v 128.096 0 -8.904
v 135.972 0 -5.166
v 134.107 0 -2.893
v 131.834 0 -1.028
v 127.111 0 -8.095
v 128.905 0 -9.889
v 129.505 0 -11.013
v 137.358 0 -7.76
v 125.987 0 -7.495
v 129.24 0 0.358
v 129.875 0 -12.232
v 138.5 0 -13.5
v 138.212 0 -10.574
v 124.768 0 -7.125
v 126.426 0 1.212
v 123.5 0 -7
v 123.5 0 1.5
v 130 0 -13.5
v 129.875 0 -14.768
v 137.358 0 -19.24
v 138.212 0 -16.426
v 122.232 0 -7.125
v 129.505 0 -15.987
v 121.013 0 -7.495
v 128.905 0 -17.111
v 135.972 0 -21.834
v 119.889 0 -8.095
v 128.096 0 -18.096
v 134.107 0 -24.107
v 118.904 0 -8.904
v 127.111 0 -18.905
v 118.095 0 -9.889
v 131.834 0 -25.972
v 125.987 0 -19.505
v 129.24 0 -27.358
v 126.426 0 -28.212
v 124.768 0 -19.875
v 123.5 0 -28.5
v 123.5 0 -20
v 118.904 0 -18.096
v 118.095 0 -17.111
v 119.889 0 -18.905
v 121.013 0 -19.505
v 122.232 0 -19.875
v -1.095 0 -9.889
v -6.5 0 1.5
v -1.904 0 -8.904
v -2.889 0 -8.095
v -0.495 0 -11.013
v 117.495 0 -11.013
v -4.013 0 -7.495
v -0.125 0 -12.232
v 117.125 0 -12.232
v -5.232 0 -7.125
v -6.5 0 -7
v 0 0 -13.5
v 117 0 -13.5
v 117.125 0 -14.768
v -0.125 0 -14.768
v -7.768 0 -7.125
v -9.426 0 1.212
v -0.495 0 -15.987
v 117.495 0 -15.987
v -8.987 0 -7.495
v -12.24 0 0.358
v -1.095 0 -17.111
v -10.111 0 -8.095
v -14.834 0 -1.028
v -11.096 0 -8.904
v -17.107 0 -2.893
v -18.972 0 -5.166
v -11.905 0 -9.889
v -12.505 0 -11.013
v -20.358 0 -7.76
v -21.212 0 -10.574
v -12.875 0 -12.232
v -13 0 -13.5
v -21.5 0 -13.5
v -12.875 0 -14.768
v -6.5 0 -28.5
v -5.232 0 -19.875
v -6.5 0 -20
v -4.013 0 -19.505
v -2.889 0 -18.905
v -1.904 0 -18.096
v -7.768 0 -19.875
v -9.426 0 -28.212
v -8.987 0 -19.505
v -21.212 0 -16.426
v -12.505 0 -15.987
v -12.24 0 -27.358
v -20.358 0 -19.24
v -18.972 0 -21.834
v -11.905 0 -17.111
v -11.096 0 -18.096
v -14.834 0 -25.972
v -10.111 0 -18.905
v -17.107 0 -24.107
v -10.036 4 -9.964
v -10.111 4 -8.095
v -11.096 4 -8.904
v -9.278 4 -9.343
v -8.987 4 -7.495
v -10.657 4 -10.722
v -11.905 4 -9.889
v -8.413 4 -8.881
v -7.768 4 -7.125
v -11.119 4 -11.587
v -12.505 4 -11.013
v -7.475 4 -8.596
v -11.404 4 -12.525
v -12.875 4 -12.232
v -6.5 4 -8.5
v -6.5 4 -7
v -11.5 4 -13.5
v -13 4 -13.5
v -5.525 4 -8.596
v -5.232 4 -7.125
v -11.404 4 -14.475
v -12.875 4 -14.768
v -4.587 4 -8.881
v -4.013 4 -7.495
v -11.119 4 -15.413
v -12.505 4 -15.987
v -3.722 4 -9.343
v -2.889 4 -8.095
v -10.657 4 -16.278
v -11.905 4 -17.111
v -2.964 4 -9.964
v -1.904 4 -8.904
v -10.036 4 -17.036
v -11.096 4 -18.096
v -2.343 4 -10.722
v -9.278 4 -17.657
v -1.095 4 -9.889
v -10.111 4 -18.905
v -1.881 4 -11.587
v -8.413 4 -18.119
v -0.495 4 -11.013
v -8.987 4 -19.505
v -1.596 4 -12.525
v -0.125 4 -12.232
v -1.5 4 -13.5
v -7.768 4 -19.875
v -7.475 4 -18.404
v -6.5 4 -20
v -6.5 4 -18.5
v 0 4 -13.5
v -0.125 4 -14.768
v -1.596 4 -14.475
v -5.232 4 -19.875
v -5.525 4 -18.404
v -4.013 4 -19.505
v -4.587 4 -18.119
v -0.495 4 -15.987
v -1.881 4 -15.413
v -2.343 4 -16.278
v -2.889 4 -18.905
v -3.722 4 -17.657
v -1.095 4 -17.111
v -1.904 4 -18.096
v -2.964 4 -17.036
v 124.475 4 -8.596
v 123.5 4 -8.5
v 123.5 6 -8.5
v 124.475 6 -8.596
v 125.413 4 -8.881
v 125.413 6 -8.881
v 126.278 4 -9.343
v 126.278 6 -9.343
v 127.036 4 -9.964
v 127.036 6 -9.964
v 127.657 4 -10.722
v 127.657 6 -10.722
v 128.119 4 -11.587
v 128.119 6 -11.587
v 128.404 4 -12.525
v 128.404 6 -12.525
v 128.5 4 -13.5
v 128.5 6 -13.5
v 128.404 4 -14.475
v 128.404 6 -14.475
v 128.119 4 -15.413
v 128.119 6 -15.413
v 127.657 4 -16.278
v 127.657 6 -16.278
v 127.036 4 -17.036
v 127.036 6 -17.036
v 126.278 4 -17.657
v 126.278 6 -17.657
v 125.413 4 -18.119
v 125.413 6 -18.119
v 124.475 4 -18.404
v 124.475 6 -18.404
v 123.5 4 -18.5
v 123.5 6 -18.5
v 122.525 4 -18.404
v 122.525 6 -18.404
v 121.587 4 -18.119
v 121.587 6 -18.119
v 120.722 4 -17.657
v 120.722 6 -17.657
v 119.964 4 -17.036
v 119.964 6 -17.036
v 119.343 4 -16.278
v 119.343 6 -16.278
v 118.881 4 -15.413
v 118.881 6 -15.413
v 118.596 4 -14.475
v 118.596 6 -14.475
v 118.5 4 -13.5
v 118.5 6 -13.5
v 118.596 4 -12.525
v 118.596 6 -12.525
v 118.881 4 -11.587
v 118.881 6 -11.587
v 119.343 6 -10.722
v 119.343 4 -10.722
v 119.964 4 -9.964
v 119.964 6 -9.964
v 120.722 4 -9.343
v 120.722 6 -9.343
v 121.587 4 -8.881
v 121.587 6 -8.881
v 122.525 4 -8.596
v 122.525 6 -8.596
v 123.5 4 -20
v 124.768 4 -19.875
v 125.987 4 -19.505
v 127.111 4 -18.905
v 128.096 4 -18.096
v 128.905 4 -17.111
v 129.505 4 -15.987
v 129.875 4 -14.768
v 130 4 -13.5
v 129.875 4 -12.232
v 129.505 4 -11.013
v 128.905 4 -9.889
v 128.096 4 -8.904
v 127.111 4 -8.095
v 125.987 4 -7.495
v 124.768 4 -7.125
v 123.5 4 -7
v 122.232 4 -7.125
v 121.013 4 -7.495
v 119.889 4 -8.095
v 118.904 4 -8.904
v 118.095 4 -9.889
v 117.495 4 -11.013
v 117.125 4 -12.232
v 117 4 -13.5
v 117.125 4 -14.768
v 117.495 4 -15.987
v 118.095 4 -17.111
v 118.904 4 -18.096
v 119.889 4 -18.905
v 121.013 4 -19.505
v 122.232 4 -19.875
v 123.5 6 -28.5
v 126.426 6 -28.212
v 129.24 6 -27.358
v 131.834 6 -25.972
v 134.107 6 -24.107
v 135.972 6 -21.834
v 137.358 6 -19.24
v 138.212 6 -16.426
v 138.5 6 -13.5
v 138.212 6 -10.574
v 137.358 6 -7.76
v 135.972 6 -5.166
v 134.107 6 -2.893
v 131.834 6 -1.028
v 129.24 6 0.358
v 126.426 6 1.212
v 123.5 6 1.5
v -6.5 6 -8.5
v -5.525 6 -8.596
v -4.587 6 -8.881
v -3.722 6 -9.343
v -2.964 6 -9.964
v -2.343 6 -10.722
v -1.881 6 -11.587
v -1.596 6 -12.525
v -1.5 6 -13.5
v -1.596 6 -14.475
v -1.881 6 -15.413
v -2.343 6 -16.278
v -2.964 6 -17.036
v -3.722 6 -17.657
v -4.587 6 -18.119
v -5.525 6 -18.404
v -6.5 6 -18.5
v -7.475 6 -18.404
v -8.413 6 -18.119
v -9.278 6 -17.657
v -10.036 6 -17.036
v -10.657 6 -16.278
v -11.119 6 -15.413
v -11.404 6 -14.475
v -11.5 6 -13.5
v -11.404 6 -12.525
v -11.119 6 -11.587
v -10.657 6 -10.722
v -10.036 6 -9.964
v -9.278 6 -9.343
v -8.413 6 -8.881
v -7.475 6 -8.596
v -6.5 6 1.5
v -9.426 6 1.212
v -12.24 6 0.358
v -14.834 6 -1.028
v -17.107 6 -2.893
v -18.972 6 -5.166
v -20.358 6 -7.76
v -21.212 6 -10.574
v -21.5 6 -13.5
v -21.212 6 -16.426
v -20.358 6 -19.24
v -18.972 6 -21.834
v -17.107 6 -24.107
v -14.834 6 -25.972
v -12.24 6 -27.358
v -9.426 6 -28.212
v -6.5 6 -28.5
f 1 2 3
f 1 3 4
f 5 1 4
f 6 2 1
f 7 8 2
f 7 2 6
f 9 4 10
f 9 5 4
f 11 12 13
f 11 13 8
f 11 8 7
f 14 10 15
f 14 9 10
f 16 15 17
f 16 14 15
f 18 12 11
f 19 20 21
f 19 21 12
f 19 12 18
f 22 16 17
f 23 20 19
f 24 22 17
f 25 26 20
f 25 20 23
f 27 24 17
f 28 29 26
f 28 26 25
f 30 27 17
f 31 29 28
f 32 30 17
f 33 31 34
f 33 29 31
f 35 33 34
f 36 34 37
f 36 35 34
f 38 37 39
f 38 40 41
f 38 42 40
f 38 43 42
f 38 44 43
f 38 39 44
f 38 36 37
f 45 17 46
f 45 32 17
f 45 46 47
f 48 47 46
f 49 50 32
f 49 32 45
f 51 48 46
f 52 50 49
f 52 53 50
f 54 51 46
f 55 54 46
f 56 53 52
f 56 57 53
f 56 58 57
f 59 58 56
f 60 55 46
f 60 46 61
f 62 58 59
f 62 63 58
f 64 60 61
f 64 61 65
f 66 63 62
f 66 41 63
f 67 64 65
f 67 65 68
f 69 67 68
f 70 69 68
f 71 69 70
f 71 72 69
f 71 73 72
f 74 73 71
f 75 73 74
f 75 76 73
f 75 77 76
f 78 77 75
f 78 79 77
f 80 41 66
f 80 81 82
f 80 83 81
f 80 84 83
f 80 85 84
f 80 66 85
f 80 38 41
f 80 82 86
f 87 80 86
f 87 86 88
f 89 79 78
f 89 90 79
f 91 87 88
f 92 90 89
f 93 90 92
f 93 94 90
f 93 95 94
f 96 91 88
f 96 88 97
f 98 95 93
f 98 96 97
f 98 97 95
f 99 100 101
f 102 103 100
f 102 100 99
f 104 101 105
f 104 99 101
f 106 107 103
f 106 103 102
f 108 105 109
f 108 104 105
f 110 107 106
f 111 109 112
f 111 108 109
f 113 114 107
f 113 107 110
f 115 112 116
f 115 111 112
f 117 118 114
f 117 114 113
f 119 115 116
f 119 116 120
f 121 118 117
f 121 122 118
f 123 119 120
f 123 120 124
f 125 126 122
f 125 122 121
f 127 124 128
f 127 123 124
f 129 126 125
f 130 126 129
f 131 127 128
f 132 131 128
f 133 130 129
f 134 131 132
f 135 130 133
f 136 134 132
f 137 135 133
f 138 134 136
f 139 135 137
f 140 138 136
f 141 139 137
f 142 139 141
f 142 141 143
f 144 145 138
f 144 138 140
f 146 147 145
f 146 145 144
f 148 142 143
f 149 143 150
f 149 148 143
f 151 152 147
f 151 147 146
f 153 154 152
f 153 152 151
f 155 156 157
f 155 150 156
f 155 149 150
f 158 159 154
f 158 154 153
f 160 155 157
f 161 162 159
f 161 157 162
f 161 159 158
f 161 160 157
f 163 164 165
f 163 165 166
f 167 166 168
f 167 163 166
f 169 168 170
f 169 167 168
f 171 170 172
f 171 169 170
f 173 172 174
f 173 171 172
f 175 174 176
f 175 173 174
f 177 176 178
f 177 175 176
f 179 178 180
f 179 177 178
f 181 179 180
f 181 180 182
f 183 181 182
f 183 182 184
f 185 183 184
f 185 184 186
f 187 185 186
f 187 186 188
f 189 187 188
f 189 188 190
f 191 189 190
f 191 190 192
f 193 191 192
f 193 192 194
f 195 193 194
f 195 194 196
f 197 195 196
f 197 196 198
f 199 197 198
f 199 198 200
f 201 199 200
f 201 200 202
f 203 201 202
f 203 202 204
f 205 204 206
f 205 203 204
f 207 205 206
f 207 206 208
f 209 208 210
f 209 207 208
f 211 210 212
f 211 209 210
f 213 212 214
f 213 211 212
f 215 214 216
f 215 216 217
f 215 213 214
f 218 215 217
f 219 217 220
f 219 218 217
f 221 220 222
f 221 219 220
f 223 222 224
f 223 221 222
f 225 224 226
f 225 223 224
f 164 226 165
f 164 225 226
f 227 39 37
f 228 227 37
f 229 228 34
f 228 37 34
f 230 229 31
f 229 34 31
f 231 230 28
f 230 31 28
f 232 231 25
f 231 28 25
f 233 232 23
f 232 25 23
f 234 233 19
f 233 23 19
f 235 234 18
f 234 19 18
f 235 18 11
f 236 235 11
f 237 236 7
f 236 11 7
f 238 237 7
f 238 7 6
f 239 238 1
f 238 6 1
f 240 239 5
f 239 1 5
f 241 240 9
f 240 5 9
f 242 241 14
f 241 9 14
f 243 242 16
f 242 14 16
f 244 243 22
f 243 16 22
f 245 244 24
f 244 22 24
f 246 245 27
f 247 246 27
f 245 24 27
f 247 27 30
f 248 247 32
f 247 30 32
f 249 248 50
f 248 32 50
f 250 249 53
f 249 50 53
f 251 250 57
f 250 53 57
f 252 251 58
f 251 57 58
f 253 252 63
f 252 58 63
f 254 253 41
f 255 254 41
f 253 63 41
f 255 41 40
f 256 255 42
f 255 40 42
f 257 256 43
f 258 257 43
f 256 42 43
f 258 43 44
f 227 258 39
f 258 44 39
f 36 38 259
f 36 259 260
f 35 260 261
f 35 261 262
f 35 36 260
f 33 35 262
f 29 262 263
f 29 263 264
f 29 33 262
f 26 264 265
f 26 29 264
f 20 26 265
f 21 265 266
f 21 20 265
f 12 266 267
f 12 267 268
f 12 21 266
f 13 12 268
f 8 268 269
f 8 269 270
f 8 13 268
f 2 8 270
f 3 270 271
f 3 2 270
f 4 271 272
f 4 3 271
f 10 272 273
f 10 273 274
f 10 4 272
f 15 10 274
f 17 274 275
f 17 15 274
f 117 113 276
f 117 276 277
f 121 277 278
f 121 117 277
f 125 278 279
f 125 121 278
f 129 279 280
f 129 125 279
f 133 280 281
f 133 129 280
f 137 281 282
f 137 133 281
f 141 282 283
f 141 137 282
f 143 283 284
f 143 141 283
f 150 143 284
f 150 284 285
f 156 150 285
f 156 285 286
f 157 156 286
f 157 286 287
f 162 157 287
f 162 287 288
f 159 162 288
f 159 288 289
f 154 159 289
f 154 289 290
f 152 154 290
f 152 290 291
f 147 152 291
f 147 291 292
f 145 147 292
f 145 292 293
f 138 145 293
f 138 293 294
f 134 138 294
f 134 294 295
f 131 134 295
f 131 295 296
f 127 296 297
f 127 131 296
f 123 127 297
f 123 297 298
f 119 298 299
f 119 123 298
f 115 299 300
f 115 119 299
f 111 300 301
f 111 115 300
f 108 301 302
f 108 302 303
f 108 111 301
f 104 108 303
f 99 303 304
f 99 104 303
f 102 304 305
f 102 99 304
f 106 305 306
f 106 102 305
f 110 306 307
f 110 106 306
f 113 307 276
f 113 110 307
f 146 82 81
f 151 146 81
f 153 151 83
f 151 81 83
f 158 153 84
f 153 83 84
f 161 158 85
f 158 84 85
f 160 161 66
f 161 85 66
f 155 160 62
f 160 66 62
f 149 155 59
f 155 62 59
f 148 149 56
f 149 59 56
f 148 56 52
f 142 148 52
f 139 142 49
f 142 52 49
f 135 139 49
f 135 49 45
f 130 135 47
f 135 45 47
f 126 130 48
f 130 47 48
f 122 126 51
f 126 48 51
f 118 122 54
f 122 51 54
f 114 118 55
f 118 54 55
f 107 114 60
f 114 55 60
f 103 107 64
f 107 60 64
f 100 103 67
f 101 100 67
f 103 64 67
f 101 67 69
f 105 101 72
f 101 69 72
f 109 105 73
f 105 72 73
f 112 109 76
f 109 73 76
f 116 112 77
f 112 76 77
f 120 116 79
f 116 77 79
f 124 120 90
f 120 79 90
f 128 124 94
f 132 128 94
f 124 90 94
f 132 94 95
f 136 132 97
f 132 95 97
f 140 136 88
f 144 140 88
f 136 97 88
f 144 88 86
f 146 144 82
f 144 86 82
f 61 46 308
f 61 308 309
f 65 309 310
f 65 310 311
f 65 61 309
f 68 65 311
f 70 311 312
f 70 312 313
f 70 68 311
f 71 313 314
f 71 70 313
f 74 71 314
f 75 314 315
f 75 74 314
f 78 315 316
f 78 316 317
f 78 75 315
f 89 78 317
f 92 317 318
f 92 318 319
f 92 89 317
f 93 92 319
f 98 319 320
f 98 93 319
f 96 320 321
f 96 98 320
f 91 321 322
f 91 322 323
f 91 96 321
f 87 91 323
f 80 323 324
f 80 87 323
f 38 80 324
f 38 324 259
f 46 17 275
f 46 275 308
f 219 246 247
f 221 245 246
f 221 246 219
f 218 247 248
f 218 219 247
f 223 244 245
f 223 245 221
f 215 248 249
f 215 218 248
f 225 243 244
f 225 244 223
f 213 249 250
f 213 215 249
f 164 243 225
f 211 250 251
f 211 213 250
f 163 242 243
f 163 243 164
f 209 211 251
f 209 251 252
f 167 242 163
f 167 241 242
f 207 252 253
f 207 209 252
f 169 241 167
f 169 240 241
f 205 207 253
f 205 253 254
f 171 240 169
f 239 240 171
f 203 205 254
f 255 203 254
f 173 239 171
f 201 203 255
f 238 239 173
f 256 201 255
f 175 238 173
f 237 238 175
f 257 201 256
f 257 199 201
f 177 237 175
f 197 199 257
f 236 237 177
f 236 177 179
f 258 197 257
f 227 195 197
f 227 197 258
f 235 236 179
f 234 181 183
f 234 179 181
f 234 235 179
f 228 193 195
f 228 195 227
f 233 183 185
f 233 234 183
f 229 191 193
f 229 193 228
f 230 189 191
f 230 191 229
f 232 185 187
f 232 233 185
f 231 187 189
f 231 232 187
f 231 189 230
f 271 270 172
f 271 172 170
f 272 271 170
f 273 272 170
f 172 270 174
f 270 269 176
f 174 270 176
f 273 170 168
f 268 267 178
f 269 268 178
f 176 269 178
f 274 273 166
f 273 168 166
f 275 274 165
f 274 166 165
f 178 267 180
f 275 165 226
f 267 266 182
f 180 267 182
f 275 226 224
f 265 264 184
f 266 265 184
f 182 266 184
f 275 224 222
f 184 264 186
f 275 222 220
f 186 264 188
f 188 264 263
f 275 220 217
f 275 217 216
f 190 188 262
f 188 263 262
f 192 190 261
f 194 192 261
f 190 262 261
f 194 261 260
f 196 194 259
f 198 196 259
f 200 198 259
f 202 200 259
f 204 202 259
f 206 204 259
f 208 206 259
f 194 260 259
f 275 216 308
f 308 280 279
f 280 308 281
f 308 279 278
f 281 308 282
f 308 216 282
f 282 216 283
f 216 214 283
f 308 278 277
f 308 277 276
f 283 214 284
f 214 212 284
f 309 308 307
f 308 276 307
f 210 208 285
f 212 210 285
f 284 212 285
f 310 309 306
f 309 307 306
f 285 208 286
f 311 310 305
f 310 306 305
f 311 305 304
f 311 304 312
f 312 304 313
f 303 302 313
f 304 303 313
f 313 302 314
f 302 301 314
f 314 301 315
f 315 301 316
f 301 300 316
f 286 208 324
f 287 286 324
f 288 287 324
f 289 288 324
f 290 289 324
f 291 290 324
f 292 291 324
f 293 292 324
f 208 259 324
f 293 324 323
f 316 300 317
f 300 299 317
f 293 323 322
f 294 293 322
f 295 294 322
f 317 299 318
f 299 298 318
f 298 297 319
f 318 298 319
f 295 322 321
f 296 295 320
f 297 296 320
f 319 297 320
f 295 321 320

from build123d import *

# Parameters (mm, degrees)
SKETCH2_R           = 5
BOSS_EXTRUDE1_DEPTH = 6
SKETCH4_R           = 6.5
CUT_EXTRUDE1_DEPTH  = 4


with BuildPart() as part:
    # Sketch2 → Boss-Extrude1 (new body)
    with BuildSketch(Plane(origin=(0, 0, 0), x_dir=(1, 0, 0), z_dir=(0, 1, 0))):
        with BuildLine():
            Line((-6.5, 28.5), (123.5, 28.5))
            ThreePointArc((123.5, 28.5), (138.5, 13.5), (123.5, -1.5))
            Line((123.5, -1.5), (-6.5, -1.5))
            ThreePointArc((-6.5, -1.5), (-21.5, 13.5), (-6.5, 28.5))
        make_face()
        with Locations(Location((-6.5, 13.5, 0), (0, 0, 270))):
            Circle(SKETCH2_R, mode=Mode.SUBTRACT)
        with Locations(Location((123.5, 13.5, 0), (0, 0, 270))):
            Circle(SKETCH2_R, mode=Mode.SUBTRACT)
    extrude(amount=BOSS_EXTRUDE1_DEPTH)

    # Sketch4 → Cut-Extrude1 (cut)
    with BuildSketch(Plane.XZ):
        with Locations(Location((123.5, -13.5, 0), (0, 0, 270))):
            Circle(SKETCH4_R)
        with Locations(Location((-6.5, -13.5, 0), (0, 0, 270))):
            Circle(SKETCH4_R)
    extrude(amount=-CUT_EXTRUDE1_DEPTH, mode=Mode.SUBTRACT)


solid = part.part
